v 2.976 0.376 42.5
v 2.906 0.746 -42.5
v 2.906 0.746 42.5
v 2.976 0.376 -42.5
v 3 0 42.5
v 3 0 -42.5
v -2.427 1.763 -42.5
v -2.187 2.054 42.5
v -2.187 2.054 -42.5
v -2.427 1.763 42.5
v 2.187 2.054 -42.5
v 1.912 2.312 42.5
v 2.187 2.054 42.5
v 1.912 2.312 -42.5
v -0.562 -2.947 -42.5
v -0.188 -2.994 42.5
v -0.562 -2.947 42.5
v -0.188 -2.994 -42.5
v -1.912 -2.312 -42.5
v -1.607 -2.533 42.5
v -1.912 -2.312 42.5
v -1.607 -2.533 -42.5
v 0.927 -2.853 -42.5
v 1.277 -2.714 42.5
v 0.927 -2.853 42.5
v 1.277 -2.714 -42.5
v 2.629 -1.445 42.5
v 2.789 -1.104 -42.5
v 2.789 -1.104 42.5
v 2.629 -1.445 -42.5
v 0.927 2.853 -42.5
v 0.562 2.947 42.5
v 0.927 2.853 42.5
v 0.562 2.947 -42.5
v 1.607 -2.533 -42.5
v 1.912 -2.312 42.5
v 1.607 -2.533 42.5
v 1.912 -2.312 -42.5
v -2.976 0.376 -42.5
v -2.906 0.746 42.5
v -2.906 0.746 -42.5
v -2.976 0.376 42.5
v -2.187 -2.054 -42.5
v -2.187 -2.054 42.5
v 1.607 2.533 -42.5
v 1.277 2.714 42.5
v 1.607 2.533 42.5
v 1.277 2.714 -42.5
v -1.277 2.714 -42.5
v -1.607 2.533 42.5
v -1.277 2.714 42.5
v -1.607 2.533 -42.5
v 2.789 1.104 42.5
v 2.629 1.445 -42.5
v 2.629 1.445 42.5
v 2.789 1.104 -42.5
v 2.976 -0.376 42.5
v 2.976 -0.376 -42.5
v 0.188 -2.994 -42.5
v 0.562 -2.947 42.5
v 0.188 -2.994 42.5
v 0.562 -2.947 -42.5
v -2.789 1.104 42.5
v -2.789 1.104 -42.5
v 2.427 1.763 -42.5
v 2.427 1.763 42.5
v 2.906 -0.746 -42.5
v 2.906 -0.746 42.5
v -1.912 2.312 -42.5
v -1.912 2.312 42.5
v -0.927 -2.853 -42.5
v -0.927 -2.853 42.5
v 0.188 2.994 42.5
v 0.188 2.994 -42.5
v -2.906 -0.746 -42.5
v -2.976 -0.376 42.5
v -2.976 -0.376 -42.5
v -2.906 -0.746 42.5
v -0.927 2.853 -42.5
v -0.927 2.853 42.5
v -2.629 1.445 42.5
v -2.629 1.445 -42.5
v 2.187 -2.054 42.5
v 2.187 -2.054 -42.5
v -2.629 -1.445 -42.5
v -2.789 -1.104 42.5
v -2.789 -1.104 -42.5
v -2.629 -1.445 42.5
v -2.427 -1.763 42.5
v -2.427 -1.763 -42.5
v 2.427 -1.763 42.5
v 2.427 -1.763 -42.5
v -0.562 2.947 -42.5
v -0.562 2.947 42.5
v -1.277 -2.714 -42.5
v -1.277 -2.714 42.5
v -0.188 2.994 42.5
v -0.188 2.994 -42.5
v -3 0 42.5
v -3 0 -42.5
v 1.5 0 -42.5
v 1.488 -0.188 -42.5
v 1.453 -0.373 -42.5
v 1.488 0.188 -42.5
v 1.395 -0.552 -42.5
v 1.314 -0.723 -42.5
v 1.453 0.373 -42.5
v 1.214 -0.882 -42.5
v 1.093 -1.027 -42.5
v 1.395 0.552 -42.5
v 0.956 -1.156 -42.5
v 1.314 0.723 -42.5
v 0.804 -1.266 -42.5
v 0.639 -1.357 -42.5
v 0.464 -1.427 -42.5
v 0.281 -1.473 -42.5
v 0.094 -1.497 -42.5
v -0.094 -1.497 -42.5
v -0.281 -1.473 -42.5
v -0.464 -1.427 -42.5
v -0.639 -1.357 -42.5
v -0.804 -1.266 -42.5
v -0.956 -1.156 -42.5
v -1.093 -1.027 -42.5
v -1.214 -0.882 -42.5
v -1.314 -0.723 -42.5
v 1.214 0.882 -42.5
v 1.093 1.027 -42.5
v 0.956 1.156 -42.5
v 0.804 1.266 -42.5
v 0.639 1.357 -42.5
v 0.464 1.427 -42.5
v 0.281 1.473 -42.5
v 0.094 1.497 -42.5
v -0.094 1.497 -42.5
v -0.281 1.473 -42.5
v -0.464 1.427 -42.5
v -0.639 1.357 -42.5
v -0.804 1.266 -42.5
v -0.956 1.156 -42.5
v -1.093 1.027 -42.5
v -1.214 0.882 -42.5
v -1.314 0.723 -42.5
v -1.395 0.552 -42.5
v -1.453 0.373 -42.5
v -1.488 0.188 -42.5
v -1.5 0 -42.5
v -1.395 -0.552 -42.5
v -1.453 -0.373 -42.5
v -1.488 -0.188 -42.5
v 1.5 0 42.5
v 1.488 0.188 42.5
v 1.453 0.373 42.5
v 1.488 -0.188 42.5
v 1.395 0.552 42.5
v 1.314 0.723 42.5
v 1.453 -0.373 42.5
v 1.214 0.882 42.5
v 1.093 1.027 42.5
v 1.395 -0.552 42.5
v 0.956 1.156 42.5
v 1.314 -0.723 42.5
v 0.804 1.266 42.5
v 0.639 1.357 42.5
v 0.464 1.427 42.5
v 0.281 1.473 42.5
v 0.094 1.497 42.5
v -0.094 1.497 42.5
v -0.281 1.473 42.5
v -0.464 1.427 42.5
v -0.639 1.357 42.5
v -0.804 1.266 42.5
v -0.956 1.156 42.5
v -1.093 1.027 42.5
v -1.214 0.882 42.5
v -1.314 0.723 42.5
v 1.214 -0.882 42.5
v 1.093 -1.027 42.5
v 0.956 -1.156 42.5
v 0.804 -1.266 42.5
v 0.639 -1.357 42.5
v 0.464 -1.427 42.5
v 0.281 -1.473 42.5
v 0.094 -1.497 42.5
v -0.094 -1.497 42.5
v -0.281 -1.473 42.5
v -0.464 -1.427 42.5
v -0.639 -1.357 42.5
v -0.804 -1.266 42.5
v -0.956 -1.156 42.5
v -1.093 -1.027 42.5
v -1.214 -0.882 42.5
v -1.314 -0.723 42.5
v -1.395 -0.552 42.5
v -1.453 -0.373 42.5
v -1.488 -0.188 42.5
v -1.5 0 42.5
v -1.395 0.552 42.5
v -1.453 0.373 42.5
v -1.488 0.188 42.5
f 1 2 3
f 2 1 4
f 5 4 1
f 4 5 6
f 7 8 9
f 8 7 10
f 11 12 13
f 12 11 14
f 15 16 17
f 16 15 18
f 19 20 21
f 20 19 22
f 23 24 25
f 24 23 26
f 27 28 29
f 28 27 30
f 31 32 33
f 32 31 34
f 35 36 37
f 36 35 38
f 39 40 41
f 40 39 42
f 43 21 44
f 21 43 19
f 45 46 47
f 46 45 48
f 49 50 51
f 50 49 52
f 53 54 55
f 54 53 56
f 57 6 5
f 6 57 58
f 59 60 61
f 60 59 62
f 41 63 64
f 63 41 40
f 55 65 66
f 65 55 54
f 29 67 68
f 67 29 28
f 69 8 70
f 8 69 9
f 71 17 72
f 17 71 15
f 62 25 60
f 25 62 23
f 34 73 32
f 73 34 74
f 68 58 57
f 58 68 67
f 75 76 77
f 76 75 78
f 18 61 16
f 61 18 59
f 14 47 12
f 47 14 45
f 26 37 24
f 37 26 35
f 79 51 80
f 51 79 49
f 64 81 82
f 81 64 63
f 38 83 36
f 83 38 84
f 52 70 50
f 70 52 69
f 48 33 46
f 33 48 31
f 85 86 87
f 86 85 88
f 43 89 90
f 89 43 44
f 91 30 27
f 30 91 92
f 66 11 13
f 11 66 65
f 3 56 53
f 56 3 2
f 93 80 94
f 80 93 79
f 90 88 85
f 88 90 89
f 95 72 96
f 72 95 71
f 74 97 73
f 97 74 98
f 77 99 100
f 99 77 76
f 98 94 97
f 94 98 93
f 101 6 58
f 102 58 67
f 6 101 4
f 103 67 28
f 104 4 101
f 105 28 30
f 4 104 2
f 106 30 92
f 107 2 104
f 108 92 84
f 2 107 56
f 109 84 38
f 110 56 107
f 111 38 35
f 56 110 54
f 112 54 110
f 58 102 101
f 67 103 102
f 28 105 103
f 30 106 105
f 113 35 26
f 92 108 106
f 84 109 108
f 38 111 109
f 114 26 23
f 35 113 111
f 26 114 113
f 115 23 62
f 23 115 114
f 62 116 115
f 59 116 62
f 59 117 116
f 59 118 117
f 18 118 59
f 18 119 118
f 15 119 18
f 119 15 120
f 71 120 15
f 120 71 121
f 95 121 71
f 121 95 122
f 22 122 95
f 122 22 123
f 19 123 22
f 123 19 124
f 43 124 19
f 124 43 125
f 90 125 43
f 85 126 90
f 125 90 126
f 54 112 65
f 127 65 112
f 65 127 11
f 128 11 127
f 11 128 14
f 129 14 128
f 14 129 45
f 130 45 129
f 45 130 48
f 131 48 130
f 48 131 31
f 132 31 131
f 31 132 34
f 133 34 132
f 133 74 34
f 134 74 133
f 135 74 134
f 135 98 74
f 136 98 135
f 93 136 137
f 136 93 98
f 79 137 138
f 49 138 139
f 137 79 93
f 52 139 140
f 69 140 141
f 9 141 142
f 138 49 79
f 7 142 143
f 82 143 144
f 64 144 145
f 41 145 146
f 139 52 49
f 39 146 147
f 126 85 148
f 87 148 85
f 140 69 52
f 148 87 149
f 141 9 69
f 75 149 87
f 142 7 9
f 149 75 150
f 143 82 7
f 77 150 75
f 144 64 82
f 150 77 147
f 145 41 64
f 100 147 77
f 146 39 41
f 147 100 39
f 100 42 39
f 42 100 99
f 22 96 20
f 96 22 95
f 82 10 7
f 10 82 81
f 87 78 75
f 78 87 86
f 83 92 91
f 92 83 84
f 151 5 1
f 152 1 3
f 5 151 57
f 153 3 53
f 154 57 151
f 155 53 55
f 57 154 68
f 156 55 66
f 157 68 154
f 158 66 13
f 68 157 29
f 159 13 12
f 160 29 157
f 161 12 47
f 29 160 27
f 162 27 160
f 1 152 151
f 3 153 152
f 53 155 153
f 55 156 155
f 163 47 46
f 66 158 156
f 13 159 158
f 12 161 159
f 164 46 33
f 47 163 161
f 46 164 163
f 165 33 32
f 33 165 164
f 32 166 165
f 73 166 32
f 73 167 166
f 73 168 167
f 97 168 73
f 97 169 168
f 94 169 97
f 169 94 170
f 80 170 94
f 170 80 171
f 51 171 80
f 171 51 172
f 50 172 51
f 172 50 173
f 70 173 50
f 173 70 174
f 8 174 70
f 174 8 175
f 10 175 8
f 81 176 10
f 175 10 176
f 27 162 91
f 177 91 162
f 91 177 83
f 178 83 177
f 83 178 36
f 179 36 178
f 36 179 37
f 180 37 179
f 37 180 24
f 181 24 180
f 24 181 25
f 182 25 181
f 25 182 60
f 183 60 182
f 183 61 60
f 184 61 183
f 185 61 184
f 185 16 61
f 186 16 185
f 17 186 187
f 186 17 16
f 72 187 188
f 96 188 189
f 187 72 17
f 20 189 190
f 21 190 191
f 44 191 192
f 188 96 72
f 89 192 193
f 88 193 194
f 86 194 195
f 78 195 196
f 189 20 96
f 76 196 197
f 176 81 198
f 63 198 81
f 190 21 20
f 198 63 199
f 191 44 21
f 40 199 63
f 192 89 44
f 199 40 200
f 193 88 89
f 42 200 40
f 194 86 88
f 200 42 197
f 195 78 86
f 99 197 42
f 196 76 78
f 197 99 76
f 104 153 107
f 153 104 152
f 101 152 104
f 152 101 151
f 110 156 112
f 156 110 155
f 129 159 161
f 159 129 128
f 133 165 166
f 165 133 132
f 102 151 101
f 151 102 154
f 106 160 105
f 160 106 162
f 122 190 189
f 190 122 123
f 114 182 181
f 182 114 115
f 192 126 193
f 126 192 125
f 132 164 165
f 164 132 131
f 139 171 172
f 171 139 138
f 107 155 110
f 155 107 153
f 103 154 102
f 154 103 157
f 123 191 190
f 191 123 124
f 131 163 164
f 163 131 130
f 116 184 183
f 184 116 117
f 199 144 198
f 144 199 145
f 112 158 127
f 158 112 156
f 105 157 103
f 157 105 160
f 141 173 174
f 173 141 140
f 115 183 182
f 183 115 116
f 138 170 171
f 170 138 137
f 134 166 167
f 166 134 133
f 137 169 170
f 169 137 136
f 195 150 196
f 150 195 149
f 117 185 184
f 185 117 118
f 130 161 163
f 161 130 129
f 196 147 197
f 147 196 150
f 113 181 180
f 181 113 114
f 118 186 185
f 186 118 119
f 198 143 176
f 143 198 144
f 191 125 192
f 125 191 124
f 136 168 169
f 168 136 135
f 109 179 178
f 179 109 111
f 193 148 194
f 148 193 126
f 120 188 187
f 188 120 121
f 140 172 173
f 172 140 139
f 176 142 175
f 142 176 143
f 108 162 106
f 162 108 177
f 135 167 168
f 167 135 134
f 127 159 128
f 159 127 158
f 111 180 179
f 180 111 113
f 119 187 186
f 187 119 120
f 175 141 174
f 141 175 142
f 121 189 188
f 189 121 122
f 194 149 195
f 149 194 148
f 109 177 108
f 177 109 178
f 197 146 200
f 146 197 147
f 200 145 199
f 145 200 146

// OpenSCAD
$fn = 50;


difference() {
	union() {
		translate(v = [0, 0, -42.5000000000]) {
			cylinder(h = 85, r = 3.0000000000);
		}
	}
	union() {
		translate(v = [0, 0, -100.0000000000]) {
			cylinder(h = 200, r = 1.5000000000);
		}
	}
}
